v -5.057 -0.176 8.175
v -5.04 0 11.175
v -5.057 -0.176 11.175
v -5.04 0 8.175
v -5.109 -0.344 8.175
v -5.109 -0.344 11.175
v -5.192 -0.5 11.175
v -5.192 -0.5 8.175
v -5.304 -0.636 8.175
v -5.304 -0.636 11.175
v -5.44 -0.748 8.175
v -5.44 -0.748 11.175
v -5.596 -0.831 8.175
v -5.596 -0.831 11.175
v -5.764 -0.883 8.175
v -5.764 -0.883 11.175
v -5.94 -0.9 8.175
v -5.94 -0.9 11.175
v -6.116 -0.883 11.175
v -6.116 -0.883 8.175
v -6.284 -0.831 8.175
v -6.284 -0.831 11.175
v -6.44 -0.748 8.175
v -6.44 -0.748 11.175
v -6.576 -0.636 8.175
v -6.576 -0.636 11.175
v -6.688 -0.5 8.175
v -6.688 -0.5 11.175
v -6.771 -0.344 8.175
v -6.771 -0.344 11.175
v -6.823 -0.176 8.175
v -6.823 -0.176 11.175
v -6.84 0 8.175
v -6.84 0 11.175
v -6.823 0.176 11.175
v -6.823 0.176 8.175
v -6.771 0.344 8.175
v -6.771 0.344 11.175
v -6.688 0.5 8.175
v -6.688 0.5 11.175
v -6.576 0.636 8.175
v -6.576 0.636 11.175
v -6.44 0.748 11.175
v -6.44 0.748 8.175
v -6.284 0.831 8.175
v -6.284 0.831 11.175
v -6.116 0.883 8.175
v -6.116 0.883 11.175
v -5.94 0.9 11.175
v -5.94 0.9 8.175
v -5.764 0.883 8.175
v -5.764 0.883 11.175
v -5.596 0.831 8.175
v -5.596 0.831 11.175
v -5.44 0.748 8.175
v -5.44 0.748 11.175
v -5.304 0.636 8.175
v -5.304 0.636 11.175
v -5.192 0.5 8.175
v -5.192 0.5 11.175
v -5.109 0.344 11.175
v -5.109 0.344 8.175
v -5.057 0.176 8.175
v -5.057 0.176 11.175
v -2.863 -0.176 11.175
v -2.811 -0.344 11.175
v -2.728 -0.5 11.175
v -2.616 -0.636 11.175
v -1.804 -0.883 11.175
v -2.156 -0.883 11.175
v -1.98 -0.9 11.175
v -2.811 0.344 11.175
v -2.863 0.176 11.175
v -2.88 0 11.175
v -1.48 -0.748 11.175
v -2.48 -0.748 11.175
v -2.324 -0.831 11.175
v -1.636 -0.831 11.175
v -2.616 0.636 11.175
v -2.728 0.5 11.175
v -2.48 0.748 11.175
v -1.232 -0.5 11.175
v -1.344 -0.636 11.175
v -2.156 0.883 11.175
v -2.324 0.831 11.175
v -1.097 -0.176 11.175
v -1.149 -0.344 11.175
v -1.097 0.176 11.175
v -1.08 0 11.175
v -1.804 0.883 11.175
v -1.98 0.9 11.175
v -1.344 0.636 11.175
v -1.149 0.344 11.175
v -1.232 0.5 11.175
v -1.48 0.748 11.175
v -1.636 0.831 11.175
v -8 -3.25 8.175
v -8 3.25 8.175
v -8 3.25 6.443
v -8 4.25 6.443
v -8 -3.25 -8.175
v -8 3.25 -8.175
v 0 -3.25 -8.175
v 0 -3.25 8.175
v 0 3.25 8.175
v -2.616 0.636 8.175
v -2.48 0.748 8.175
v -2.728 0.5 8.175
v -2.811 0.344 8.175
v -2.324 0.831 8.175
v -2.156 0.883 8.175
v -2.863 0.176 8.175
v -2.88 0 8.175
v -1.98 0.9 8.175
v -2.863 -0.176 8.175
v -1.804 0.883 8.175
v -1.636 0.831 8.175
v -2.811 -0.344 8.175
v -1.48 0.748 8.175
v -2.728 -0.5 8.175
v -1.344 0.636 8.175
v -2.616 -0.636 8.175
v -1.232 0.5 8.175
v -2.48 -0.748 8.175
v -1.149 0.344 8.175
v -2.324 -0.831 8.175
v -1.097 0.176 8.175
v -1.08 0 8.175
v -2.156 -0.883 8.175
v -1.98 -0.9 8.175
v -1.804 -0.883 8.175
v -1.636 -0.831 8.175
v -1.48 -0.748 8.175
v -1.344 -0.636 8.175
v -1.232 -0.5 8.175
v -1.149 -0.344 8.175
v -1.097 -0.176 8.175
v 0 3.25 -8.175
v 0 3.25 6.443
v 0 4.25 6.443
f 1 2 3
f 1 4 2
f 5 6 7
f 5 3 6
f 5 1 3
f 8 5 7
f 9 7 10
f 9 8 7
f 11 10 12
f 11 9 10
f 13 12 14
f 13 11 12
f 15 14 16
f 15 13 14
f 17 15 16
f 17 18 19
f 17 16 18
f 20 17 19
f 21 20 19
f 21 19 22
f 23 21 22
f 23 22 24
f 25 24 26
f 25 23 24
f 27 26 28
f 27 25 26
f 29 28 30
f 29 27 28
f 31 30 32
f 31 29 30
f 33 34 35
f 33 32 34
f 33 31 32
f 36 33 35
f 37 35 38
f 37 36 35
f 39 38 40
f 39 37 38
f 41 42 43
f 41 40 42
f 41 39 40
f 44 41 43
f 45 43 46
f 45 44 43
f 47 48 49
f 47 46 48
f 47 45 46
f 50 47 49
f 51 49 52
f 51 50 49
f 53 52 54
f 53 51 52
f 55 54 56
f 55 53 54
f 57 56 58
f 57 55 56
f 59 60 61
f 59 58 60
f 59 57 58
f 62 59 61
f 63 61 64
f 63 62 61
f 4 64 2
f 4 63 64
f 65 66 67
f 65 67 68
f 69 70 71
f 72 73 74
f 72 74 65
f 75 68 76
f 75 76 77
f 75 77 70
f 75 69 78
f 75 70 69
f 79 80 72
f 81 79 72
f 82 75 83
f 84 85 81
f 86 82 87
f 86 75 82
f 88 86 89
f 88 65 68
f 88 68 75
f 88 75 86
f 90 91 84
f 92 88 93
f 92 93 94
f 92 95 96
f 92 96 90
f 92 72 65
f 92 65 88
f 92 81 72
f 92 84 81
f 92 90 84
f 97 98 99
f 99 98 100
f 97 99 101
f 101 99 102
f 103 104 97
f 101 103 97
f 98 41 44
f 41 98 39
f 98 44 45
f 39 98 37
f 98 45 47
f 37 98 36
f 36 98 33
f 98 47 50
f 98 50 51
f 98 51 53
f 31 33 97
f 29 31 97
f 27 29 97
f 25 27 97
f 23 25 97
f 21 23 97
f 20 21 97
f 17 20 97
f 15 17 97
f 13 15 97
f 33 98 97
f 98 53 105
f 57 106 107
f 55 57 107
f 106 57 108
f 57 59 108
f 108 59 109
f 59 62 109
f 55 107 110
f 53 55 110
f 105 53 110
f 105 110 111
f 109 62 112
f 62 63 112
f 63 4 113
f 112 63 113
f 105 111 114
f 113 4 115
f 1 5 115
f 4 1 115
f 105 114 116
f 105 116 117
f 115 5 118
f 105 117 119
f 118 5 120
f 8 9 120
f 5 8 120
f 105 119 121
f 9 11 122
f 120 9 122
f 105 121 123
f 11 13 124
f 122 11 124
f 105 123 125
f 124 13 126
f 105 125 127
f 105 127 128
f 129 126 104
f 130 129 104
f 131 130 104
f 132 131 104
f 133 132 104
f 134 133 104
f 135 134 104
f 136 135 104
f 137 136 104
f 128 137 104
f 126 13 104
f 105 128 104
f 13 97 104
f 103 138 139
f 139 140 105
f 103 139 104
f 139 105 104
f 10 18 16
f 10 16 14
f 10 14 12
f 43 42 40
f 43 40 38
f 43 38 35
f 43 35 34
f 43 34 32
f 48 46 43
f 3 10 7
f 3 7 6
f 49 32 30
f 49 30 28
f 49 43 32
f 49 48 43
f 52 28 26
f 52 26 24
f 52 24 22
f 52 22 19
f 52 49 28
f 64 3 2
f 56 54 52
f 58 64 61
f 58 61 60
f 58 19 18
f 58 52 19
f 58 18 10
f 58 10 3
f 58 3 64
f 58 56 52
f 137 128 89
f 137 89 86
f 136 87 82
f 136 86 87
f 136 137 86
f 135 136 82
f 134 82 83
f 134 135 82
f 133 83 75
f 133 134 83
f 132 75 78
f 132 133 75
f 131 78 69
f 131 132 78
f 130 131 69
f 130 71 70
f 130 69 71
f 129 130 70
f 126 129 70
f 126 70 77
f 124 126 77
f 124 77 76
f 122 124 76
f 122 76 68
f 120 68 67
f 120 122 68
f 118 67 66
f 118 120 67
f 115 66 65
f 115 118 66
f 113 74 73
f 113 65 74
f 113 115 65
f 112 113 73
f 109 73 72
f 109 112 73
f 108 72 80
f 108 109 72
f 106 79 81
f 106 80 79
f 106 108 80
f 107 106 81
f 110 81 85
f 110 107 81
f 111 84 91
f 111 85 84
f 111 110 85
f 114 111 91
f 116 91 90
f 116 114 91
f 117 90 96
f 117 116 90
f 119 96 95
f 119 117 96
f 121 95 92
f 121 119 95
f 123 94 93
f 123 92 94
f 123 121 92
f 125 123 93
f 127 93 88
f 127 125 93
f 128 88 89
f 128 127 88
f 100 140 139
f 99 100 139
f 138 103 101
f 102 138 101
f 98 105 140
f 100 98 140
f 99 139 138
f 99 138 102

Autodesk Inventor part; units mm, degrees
ref_plane "YZ Plane" through (0, 0, 0) normal (1, 0, 0) x (0, 1, 0)
ref_plane "XZ Plane" through (0, 0, 0) normal (0, 1, 0) x (-1, 0, 0)
ref_plane "XY Plane" through (0, 0, 0) normal (0, 0, 1) x (1, 0, 0)
sketch "Boceto1" plane through (0, 0, 0) normal (0, 1, 0) x (-1, 0, 0)
  line L0 (8, 8.175) -> (-8, 8.175)
  line L1 (-8, 8.175) -> (-8, -8.175)
  line L2 (-8, -8.175) -> (8, -8.175)
  line L3 (8, -8.175) -> (8, 8.175)
  point P0 (0, 0)
  dimension "d0" = 16.35
  dimension "d1" = 16
  dimension "d2" = 8
  dimension "d3" = 8.175
extrude "Extrusión1" add sketch "Boceto1" along normal mid plane 6.5
sketch "Boceto2" plane through (8, -3.25, -8.175) normal (1, 0, 0) x (0, 0, -1)
  line L0 (0, 0) -> (0, 6.5) projected
  line L1 (-16.35, 6.5) -> (0, 6.5) projected
  line L2 (-16.35, 0) -> (-16.35, 6.5) projected
  line L3 (0, 0) -> (-16.35, 0) projected
  line L4 (0, 6.5) -> (-16.35, 6.5) projected
  line L5 (-16.35, 6.5) -> (-14.6179, 7.5)
  line L6 (-14.6179, 7.5) -> (-14.6179, 6.5)
  line L7 (-16.35, 6.5) -> (-14.6179, 6.5)
  point P0 (-8.175, 3.25)
  dimension "d6" = 7.5
  dimension "d7" = 60
extrude "Extrusión2" add sketch "Boceto2" against normal blind 16 contours L1 L5 L6
sketch "Boceto3" plane through (-8, -3.25, 8.175) normal (0, 0, 1) x (1, 0, 0)
  line L0 (16, 0) -> (16, 6.5) projected
  line L1 (0, 6.5) -> (16, 6.5) projected
  line L2 (0, 0) -> (0, 6.5) projected
  line L3 (16, 0) -> (0, 0) projected
  circle A0 centre (13.94, 3.25) radius 0.9
  circle A1 centre (9.98, 3.25) radius 0.9
  circle A2 centre (6.02, 3.25) radius 0.9
  circle A3 centre (2.06, 3.25) radius 0.9
  point P0 (8, 3.25)
  dimension "d10" = 3.25
  dimension "P" = 3.96
  dimension "d12" = 3.96
  dimension "d13" = 3.96
  dimension "d14" = 2.06
  dimension "d15" = 1.8
  dimension "d16" = 1.8
  dimension "d17" = 1.8
  dimension "d18" = 1.8
extrude "Extrusión3" add sketch "Boceto3" along normal blind 3 contours A0 | A1 | A2 | A3
sketch "Boceto4" plane through (-8, -3.25, 8.175) normal (0, 0, 1) x (1, 0, 0)
  circle A0 centre (6.02, 3.25) radius 0.9 projected
  circle A1 centre (9.98, 3.25) radius 0.9 projected
  circle A2 centre (2.06, 3.25) radius 0.9 projected
  circle A3 centre (13.94, 3.25) radius 0.9 projected
  line L0 (16, 0) -> (16, 6.5) projected
  line L1 (0, 6.5) -> (16, 6.5) projected
  line L2 (0, 0) -> (0, 6.5) projected
  line L3 (16, 0) -> (0, 0) projected
  line L4 (8, 0) -> (16.3652, 0)
  line L5 (16.3652, 0) -> (16.3652, 8.0001)
  line L6 (16.3652, 8.0001) -> (8, 8.0001)
  line L7 (8, 8.0001) -> (8, 0)
  point P0 (8, 3.25)
extrude "Extrusión4" cut sketch "Boceto4" against normal mid plane 40 contours A1 | A3 | L3 L7 L1 L0 | L0 L1 L7 L6 L5 L4
equation "\"d12\" = P"
equation "\"d13\" = P"
properties part number "conector_4pines"
